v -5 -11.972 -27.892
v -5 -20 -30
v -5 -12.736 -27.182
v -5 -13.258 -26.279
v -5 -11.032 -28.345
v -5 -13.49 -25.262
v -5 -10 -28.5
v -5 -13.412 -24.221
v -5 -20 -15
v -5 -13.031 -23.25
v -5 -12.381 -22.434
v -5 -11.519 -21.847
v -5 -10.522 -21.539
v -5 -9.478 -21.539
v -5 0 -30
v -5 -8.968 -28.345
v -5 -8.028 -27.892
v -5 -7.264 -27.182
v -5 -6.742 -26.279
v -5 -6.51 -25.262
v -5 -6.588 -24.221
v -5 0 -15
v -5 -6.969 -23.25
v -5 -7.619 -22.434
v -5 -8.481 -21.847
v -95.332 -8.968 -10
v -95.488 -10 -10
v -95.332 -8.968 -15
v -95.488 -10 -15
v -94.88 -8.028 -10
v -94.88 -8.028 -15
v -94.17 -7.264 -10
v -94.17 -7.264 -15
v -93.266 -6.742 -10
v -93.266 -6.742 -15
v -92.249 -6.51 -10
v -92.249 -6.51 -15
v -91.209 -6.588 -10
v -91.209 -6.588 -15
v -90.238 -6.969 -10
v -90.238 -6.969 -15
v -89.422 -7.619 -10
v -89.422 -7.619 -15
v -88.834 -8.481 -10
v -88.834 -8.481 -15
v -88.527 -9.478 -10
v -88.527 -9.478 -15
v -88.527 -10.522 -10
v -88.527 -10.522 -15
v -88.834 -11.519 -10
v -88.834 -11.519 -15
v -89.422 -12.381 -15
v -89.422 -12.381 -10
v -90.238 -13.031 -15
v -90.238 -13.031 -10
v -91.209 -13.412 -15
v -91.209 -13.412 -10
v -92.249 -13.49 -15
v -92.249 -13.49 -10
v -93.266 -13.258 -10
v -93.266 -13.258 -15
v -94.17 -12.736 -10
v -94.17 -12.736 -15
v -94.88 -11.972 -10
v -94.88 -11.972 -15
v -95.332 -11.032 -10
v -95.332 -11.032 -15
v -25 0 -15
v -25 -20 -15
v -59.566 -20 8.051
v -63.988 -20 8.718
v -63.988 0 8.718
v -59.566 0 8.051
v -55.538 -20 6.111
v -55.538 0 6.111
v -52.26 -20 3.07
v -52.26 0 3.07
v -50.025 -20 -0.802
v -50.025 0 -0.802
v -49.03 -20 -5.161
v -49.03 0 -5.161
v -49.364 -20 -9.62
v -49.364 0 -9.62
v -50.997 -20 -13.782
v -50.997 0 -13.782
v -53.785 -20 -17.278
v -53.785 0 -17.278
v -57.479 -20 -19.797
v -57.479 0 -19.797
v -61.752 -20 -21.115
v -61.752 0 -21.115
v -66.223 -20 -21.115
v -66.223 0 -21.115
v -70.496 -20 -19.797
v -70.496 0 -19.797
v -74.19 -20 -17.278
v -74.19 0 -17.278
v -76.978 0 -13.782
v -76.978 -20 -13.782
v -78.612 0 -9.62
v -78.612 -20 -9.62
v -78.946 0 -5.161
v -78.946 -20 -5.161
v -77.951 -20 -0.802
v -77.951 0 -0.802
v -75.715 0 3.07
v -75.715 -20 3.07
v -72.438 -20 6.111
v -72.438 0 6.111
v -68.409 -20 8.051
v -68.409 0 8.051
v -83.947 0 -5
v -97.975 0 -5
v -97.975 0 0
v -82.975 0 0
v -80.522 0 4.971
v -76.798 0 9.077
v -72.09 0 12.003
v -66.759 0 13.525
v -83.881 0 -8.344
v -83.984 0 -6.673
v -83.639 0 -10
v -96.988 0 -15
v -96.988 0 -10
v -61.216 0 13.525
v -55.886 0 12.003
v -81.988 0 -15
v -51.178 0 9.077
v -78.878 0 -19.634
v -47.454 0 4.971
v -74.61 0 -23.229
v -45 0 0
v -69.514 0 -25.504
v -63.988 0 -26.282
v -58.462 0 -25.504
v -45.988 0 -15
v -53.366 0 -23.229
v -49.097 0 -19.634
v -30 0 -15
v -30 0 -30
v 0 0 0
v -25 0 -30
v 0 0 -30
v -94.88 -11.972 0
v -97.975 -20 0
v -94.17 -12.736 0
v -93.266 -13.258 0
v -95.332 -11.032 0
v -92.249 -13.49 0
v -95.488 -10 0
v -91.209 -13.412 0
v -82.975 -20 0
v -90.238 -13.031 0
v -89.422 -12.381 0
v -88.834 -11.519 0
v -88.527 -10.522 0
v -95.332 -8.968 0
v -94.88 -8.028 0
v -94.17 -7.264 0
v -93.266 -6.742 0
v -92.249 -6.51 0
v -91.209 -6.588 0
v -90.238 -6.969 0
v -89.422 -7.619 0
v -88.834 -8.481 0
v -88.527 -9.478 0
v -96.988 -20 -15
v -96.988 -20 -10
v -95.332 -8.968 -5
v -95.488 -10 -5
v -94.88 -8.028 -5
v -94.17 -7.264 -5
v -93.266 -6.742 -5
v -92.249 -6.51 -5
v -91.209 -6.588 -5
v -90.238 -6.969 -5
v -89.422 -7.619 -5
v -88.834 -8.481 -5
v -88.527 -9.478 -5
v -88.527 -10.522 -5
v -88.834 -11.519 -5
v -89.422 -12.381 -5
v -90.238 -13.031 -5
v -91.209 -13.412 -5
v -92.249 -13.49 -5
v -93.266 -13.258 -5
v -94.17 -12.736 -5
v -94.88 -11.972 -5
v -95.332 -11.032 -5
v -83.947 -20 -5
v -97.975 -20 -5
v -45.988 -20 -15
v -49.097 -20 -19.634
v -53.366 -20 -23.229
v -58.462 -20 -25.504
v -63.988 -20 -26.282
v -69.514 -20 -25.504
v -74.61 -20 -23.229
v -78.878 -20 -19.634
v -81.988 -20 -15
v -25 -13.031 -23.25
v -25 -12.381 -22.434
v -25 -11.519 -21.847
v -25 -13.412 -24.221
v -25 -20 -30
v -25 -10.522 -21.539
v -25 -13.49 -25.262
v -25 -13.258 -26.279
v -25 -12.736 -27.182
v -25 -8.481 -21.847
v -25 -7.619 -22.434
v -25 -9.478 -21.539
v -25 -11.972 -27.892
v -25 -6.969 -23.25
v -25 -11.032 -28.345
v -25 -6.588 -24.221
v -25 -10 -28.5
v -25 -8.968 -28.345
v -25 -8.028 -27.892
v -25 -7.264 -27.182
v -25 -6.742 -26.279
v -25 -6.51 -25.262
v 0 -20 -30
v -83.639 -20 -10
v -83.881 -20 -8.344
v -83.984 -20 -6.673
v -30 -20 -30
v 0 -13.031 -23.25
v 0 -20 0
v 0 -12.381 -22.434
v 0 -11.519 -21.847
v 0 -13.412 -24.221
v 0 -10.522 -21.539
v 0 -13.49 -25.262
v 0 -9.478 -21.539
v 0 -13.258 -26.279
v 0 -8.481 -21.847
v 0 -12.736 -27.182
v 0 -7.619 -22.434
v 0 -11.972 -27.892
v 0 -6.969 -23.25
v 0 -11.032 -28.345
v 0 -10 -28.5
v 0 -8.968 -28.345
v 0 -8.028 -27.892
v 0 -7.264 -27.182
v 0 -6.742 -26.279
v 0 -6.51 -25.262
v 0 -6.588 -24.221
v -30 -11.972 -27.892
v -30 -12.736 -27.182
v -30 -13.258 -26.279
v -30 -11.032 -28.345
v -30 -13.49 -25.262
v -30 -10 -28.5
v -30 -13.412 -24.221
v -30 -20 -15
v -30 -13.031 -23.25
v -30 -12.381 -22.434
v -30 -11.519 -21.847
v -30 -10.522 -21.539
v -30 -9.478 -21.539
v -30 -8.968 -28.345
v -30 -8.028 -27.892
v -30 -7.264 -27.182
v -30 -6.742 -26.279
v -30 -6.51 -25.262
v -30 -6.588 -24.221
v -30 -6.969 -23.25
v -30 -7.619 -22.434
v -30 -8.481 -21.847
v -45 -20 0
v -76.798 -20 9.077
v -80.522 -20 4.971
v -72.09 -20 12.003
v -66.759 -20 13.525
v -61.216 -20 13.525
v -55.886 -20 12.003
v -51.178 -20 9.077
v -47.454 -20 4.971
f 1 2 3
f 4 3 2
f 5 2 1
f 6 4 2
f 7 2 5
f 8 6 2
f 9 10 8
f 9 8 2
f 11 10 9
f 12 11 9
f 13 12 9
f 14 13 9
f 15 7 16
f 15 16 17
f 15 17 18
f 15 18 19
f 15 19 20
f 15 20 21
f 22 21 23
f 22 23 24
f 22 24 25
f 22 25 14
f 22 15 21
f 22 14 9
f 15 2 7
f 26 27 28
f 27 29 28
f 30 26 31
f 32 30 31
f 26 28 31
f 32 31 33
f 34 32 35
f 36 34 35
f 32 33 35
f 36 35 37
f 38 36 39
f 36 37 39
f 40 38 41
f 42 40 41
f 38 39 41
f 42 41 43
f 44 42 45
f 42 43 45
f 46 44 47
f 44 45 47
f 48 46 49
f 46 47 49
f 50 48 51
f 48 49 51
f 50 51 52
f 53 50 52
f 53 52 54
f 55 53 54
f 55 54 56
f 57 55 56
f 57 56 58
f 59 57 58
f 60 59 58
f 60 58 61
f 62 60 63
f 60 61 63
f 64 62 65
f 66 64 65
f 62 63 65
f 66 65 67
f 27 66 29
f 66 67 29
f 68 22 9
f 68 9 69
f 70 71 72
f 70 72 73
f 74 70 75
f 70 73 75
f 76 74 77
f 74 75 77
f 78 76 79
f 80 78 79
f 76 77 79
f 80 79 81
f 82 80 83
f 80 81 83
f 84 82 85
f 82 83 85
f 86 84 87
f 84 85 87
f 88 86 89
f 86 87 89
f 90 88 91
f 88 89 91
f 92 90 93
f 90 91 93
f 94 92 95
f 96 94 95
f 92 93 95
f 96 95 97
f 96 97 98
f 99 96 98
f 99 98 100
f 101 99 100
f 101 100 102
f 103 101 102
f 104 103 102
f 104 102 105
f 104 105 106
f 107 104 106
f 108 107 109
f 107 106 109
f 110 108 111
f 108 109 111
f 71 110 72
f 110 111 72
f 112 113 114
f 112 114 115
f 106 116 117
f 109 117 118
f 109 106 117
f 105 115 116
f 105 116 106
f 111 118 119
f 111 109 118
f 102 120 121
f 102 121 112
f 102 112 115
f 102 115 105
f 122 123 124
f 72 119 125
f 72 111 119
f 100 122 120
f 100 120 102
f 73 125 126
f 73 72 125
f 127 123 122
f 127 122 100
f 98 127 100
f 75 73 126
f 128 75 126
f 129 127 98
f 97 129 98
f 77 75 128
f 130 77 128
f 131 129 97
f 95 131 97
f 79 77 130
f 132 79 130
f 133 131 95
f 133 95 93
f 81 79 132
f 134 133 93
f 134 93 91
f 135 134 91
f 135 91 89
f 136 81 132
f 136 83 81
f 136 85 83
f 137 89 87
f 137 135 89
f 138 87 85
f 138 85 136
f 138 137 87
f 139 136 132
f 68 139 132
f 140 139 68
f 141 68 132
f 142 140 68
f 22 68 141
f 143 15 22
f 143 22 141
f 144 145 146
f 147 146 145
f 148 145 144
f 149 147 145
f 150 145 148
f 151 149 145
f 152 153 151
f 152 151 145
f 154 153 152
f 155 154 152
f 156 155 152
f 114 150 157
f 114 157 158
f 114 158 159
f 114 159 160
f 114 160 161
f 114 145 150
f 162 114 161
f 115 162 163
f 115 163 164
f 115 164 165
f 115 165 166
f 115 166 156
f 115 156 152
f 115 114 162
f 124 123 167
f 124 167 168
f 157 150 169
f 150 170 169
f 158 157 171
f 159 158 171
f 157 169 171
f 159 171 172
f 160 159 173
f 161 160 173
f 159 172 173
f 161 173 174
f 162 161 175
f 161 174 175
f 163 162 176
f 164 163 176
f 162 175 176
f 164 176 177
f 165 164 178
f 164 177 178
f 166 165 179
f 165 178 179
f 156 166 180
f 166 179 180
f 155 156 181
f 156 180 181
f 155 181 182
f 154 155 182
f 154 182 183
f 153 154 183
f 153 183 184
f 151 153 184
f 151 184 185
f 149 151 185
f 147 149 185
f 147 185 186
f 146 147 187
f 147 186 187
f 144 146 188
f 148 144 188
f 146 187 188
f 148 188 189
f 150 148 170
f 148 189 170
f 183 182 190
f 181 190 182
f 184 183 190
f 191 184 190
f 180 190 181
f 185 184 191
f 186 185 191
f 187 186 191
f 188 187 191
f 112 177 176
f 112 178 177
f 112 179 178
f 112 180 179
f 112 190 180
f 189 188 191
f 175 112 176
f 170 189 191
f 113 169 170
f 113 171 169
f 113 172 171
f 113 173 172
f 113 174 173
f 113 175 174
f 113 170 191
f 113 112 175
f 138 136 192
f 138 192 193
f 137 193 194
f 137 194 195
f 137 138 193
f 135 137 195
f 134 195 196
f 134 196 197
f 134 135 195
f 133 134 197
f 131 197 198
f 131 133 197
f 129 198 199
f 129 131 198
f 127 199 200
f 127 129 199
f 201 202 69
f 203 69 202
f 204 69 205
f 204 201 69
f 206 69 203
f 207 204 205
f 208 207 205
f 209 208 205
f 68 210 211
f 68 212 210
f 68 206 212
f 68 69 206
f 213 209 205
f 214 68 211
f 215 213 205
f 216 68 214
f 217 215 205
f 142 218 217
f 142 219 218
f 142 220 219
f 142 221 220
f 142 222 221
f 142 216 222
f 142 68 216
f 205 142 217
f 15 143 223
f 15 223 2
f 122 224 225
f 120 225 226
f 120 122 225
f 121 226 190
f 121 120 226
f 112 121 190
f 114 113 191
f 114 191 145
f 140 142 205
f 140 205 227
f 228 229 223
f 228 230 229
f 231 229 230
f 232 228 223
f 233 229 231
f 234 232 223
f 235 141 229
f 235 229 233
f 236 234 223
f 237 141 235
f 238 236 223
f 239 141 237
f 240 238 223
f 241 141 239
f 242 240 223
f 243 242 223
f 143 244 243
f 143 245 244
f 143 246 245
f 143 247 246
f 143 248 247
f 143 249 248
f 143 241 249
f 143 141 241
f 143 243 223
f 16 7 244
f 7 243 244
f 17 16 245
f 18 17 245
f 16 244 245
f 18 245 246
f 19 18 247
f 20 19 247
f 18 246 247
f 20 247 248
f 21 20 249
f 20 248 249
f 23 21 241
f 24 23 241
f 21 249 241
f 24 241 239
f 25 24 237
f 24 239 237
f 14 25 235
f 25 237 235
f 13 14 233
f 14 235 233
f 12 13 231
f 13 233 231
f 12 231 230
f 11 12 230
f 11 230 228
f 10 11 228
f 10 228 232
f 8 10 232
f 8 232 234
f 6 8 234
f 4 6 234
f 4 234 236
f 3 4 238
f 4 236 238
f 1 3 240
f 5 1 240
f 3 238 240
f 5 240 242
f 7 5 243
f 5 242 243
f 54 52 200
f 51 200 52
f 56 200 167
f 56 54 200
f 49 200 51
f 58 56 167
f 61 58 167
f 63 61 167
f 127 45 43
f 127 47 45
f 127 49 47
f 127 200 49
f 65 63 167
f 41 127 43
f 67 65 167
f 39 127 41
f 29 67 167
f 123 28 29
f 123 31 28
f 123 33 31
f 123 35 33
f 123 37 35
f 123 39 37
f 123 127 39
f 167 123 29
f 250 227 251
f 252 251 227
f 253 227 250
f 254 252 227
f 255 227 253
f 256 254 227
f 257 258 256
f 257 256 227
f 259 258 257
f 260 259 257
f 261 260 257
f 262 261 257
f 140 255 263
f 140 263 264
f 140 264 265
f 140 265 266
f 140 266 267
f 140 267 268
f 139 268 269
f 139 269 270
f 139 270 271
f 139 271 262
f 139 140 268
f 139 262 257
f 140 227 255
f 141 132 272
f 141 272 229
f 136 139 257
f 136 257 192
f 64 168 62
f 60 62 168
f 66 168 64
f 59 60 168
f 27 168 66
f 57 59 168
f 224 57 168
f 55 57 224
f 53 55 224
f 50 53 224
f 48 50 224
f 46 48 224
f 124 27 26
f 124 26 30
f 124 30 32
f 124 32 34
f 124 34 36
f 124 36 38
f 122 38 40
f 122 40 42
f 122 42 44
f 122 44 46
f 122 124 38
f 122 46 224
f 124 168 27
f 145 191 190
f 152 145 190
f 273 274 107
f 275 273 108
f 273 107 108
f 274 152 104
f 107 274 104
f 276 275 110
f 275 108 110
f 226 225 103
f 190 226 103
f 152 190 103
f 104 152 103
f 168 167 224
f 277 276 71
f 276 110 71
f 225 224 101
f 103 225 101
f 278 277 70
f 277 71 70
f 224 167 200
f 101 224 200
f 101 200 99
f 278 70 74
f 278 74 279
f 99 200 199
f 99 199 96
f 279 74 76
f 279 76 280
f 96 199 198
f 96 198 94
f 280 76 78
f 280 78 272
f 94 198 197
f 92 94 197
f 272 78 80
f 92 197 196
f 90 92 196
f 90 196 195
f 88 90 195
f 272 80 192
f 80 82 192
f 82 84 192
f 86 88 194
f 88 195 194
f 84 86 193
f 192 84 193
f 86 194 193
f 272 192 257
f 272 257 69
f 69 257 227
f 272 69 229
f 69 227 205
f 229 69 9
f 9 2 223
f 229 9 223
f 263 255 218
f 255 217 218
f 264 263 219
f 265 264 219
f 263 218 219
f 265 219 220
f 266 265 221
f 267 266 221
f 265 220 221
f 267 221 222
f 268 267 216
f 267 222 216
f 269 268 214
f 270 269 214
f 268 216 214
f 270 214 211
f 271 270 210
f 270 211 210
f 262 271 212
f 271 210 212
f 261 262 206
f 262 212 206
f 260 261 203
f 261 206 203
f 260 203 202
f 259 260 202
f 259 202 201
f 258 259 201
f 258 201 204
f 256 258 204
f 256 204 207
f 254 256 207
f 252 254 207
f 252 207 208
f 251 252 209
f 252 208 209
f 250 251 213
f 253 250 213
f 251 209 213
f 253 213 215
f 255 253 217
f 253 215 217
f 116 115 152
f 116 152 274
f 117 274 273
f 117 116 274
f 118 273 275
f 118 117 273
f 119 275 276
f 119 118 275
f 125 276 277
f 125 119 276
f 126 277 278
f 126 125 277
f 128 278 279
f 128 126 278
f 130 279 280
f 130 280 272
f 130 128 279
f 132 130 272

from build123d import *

# Parameters (mm, degrees)
SKETCH2_R           = 15
BOSS_EXTRUDE1_DEPTH = 20
SKETCH3_R           = 3.5
CUT_EXTRUDE1_DEPTH  = 36.5
SKETCH4_R           = 3.5
CUT_EXTRUDE2_DEPTH  = 36.5


with BuildPart() as part:
    # Sketch2 → Boss-Extrude1 (new body)
    with BuildSketch(Plane(origin=(0, 0, 0), x_dir=(1, 0, 0), z_dir=(0, 1, 0))):
        with BuildLine():
            Line((0, 0), (0, 30))
            Line((0, 30), (-5, 30))
            Line((-5, 30), (-5, 15))
            Line((-5, 15), (-25, 15))
            Line((-25, 15), (-25, 30))
            Line((-25, 30), (-30, 30))
            Line((-30, 30), (-30, 15))
            Line((-30, 15), (-45.987731213, 15))
            ThreePointArc((-45.987731213, 15), (-63.987731213, 26.282202113), (-81.987731213, 15))
            Line((-81.987731213, 15), (-96.987731213, 15))
            Line((-96.987731213, 15), (-96.987731213, 10))
            Line((-96.987731213, 10), (-83.639142838, 10))
            ThreePointArc((-83.639142838, 10), (-83.950029119, 7.509663844), (-83.946587837, 5))
            Line((-83.946587837, 5), (-97.975462426, 5))
            Line((-97.975462426, 5), (-97.975462426, 0))
            Line((-97.975462426, 0), (-82.975462426, 0))
            ThreePointArc((-82.975462426, 0), (-63.987731213, -13.717797887), (-45, 0))
            Line((-45, 0), (0, 0))
        make_face()
        with Locations(Location((-63.987731213, 6.282202113, 0), (0, 0, 270))):
            Circle(SKETCH2_R, mode=Mode.SUBTRACT)
    extrude(amount=-BOSS_EXTRUDE1_DEPTH)

    # Sketch3 → Cut-Extrude1 (cut, symmetric)
    with BuildSketch(Plane(origin=(0, 0, 0), x_dir=(0, 0, -1), z_dir=(1, 0, 0))):
        with Locations((25, -10)):
            Circle(SKETCH3_R)
    extrude(amount=CUT_EXTRUDE1_DEPTH, both=True, mode=Mode.SUBTRACT)

    # Sketch4 → Cut-Extrude2 (cut, symmetric)
    with BuildSketch(Plane(origin=(0, 0, -15), x_dir=(-1, 0, 0), z_dir=(0, 0, -1))):
        with Locations((91.987731213, -10)):
            Circle(SKETCH4_R)
    extrude(amount=CUT_EXTRUDE2_DEPTH, both=True, mode=Mode.SUBTRACT)


solid = part.part
